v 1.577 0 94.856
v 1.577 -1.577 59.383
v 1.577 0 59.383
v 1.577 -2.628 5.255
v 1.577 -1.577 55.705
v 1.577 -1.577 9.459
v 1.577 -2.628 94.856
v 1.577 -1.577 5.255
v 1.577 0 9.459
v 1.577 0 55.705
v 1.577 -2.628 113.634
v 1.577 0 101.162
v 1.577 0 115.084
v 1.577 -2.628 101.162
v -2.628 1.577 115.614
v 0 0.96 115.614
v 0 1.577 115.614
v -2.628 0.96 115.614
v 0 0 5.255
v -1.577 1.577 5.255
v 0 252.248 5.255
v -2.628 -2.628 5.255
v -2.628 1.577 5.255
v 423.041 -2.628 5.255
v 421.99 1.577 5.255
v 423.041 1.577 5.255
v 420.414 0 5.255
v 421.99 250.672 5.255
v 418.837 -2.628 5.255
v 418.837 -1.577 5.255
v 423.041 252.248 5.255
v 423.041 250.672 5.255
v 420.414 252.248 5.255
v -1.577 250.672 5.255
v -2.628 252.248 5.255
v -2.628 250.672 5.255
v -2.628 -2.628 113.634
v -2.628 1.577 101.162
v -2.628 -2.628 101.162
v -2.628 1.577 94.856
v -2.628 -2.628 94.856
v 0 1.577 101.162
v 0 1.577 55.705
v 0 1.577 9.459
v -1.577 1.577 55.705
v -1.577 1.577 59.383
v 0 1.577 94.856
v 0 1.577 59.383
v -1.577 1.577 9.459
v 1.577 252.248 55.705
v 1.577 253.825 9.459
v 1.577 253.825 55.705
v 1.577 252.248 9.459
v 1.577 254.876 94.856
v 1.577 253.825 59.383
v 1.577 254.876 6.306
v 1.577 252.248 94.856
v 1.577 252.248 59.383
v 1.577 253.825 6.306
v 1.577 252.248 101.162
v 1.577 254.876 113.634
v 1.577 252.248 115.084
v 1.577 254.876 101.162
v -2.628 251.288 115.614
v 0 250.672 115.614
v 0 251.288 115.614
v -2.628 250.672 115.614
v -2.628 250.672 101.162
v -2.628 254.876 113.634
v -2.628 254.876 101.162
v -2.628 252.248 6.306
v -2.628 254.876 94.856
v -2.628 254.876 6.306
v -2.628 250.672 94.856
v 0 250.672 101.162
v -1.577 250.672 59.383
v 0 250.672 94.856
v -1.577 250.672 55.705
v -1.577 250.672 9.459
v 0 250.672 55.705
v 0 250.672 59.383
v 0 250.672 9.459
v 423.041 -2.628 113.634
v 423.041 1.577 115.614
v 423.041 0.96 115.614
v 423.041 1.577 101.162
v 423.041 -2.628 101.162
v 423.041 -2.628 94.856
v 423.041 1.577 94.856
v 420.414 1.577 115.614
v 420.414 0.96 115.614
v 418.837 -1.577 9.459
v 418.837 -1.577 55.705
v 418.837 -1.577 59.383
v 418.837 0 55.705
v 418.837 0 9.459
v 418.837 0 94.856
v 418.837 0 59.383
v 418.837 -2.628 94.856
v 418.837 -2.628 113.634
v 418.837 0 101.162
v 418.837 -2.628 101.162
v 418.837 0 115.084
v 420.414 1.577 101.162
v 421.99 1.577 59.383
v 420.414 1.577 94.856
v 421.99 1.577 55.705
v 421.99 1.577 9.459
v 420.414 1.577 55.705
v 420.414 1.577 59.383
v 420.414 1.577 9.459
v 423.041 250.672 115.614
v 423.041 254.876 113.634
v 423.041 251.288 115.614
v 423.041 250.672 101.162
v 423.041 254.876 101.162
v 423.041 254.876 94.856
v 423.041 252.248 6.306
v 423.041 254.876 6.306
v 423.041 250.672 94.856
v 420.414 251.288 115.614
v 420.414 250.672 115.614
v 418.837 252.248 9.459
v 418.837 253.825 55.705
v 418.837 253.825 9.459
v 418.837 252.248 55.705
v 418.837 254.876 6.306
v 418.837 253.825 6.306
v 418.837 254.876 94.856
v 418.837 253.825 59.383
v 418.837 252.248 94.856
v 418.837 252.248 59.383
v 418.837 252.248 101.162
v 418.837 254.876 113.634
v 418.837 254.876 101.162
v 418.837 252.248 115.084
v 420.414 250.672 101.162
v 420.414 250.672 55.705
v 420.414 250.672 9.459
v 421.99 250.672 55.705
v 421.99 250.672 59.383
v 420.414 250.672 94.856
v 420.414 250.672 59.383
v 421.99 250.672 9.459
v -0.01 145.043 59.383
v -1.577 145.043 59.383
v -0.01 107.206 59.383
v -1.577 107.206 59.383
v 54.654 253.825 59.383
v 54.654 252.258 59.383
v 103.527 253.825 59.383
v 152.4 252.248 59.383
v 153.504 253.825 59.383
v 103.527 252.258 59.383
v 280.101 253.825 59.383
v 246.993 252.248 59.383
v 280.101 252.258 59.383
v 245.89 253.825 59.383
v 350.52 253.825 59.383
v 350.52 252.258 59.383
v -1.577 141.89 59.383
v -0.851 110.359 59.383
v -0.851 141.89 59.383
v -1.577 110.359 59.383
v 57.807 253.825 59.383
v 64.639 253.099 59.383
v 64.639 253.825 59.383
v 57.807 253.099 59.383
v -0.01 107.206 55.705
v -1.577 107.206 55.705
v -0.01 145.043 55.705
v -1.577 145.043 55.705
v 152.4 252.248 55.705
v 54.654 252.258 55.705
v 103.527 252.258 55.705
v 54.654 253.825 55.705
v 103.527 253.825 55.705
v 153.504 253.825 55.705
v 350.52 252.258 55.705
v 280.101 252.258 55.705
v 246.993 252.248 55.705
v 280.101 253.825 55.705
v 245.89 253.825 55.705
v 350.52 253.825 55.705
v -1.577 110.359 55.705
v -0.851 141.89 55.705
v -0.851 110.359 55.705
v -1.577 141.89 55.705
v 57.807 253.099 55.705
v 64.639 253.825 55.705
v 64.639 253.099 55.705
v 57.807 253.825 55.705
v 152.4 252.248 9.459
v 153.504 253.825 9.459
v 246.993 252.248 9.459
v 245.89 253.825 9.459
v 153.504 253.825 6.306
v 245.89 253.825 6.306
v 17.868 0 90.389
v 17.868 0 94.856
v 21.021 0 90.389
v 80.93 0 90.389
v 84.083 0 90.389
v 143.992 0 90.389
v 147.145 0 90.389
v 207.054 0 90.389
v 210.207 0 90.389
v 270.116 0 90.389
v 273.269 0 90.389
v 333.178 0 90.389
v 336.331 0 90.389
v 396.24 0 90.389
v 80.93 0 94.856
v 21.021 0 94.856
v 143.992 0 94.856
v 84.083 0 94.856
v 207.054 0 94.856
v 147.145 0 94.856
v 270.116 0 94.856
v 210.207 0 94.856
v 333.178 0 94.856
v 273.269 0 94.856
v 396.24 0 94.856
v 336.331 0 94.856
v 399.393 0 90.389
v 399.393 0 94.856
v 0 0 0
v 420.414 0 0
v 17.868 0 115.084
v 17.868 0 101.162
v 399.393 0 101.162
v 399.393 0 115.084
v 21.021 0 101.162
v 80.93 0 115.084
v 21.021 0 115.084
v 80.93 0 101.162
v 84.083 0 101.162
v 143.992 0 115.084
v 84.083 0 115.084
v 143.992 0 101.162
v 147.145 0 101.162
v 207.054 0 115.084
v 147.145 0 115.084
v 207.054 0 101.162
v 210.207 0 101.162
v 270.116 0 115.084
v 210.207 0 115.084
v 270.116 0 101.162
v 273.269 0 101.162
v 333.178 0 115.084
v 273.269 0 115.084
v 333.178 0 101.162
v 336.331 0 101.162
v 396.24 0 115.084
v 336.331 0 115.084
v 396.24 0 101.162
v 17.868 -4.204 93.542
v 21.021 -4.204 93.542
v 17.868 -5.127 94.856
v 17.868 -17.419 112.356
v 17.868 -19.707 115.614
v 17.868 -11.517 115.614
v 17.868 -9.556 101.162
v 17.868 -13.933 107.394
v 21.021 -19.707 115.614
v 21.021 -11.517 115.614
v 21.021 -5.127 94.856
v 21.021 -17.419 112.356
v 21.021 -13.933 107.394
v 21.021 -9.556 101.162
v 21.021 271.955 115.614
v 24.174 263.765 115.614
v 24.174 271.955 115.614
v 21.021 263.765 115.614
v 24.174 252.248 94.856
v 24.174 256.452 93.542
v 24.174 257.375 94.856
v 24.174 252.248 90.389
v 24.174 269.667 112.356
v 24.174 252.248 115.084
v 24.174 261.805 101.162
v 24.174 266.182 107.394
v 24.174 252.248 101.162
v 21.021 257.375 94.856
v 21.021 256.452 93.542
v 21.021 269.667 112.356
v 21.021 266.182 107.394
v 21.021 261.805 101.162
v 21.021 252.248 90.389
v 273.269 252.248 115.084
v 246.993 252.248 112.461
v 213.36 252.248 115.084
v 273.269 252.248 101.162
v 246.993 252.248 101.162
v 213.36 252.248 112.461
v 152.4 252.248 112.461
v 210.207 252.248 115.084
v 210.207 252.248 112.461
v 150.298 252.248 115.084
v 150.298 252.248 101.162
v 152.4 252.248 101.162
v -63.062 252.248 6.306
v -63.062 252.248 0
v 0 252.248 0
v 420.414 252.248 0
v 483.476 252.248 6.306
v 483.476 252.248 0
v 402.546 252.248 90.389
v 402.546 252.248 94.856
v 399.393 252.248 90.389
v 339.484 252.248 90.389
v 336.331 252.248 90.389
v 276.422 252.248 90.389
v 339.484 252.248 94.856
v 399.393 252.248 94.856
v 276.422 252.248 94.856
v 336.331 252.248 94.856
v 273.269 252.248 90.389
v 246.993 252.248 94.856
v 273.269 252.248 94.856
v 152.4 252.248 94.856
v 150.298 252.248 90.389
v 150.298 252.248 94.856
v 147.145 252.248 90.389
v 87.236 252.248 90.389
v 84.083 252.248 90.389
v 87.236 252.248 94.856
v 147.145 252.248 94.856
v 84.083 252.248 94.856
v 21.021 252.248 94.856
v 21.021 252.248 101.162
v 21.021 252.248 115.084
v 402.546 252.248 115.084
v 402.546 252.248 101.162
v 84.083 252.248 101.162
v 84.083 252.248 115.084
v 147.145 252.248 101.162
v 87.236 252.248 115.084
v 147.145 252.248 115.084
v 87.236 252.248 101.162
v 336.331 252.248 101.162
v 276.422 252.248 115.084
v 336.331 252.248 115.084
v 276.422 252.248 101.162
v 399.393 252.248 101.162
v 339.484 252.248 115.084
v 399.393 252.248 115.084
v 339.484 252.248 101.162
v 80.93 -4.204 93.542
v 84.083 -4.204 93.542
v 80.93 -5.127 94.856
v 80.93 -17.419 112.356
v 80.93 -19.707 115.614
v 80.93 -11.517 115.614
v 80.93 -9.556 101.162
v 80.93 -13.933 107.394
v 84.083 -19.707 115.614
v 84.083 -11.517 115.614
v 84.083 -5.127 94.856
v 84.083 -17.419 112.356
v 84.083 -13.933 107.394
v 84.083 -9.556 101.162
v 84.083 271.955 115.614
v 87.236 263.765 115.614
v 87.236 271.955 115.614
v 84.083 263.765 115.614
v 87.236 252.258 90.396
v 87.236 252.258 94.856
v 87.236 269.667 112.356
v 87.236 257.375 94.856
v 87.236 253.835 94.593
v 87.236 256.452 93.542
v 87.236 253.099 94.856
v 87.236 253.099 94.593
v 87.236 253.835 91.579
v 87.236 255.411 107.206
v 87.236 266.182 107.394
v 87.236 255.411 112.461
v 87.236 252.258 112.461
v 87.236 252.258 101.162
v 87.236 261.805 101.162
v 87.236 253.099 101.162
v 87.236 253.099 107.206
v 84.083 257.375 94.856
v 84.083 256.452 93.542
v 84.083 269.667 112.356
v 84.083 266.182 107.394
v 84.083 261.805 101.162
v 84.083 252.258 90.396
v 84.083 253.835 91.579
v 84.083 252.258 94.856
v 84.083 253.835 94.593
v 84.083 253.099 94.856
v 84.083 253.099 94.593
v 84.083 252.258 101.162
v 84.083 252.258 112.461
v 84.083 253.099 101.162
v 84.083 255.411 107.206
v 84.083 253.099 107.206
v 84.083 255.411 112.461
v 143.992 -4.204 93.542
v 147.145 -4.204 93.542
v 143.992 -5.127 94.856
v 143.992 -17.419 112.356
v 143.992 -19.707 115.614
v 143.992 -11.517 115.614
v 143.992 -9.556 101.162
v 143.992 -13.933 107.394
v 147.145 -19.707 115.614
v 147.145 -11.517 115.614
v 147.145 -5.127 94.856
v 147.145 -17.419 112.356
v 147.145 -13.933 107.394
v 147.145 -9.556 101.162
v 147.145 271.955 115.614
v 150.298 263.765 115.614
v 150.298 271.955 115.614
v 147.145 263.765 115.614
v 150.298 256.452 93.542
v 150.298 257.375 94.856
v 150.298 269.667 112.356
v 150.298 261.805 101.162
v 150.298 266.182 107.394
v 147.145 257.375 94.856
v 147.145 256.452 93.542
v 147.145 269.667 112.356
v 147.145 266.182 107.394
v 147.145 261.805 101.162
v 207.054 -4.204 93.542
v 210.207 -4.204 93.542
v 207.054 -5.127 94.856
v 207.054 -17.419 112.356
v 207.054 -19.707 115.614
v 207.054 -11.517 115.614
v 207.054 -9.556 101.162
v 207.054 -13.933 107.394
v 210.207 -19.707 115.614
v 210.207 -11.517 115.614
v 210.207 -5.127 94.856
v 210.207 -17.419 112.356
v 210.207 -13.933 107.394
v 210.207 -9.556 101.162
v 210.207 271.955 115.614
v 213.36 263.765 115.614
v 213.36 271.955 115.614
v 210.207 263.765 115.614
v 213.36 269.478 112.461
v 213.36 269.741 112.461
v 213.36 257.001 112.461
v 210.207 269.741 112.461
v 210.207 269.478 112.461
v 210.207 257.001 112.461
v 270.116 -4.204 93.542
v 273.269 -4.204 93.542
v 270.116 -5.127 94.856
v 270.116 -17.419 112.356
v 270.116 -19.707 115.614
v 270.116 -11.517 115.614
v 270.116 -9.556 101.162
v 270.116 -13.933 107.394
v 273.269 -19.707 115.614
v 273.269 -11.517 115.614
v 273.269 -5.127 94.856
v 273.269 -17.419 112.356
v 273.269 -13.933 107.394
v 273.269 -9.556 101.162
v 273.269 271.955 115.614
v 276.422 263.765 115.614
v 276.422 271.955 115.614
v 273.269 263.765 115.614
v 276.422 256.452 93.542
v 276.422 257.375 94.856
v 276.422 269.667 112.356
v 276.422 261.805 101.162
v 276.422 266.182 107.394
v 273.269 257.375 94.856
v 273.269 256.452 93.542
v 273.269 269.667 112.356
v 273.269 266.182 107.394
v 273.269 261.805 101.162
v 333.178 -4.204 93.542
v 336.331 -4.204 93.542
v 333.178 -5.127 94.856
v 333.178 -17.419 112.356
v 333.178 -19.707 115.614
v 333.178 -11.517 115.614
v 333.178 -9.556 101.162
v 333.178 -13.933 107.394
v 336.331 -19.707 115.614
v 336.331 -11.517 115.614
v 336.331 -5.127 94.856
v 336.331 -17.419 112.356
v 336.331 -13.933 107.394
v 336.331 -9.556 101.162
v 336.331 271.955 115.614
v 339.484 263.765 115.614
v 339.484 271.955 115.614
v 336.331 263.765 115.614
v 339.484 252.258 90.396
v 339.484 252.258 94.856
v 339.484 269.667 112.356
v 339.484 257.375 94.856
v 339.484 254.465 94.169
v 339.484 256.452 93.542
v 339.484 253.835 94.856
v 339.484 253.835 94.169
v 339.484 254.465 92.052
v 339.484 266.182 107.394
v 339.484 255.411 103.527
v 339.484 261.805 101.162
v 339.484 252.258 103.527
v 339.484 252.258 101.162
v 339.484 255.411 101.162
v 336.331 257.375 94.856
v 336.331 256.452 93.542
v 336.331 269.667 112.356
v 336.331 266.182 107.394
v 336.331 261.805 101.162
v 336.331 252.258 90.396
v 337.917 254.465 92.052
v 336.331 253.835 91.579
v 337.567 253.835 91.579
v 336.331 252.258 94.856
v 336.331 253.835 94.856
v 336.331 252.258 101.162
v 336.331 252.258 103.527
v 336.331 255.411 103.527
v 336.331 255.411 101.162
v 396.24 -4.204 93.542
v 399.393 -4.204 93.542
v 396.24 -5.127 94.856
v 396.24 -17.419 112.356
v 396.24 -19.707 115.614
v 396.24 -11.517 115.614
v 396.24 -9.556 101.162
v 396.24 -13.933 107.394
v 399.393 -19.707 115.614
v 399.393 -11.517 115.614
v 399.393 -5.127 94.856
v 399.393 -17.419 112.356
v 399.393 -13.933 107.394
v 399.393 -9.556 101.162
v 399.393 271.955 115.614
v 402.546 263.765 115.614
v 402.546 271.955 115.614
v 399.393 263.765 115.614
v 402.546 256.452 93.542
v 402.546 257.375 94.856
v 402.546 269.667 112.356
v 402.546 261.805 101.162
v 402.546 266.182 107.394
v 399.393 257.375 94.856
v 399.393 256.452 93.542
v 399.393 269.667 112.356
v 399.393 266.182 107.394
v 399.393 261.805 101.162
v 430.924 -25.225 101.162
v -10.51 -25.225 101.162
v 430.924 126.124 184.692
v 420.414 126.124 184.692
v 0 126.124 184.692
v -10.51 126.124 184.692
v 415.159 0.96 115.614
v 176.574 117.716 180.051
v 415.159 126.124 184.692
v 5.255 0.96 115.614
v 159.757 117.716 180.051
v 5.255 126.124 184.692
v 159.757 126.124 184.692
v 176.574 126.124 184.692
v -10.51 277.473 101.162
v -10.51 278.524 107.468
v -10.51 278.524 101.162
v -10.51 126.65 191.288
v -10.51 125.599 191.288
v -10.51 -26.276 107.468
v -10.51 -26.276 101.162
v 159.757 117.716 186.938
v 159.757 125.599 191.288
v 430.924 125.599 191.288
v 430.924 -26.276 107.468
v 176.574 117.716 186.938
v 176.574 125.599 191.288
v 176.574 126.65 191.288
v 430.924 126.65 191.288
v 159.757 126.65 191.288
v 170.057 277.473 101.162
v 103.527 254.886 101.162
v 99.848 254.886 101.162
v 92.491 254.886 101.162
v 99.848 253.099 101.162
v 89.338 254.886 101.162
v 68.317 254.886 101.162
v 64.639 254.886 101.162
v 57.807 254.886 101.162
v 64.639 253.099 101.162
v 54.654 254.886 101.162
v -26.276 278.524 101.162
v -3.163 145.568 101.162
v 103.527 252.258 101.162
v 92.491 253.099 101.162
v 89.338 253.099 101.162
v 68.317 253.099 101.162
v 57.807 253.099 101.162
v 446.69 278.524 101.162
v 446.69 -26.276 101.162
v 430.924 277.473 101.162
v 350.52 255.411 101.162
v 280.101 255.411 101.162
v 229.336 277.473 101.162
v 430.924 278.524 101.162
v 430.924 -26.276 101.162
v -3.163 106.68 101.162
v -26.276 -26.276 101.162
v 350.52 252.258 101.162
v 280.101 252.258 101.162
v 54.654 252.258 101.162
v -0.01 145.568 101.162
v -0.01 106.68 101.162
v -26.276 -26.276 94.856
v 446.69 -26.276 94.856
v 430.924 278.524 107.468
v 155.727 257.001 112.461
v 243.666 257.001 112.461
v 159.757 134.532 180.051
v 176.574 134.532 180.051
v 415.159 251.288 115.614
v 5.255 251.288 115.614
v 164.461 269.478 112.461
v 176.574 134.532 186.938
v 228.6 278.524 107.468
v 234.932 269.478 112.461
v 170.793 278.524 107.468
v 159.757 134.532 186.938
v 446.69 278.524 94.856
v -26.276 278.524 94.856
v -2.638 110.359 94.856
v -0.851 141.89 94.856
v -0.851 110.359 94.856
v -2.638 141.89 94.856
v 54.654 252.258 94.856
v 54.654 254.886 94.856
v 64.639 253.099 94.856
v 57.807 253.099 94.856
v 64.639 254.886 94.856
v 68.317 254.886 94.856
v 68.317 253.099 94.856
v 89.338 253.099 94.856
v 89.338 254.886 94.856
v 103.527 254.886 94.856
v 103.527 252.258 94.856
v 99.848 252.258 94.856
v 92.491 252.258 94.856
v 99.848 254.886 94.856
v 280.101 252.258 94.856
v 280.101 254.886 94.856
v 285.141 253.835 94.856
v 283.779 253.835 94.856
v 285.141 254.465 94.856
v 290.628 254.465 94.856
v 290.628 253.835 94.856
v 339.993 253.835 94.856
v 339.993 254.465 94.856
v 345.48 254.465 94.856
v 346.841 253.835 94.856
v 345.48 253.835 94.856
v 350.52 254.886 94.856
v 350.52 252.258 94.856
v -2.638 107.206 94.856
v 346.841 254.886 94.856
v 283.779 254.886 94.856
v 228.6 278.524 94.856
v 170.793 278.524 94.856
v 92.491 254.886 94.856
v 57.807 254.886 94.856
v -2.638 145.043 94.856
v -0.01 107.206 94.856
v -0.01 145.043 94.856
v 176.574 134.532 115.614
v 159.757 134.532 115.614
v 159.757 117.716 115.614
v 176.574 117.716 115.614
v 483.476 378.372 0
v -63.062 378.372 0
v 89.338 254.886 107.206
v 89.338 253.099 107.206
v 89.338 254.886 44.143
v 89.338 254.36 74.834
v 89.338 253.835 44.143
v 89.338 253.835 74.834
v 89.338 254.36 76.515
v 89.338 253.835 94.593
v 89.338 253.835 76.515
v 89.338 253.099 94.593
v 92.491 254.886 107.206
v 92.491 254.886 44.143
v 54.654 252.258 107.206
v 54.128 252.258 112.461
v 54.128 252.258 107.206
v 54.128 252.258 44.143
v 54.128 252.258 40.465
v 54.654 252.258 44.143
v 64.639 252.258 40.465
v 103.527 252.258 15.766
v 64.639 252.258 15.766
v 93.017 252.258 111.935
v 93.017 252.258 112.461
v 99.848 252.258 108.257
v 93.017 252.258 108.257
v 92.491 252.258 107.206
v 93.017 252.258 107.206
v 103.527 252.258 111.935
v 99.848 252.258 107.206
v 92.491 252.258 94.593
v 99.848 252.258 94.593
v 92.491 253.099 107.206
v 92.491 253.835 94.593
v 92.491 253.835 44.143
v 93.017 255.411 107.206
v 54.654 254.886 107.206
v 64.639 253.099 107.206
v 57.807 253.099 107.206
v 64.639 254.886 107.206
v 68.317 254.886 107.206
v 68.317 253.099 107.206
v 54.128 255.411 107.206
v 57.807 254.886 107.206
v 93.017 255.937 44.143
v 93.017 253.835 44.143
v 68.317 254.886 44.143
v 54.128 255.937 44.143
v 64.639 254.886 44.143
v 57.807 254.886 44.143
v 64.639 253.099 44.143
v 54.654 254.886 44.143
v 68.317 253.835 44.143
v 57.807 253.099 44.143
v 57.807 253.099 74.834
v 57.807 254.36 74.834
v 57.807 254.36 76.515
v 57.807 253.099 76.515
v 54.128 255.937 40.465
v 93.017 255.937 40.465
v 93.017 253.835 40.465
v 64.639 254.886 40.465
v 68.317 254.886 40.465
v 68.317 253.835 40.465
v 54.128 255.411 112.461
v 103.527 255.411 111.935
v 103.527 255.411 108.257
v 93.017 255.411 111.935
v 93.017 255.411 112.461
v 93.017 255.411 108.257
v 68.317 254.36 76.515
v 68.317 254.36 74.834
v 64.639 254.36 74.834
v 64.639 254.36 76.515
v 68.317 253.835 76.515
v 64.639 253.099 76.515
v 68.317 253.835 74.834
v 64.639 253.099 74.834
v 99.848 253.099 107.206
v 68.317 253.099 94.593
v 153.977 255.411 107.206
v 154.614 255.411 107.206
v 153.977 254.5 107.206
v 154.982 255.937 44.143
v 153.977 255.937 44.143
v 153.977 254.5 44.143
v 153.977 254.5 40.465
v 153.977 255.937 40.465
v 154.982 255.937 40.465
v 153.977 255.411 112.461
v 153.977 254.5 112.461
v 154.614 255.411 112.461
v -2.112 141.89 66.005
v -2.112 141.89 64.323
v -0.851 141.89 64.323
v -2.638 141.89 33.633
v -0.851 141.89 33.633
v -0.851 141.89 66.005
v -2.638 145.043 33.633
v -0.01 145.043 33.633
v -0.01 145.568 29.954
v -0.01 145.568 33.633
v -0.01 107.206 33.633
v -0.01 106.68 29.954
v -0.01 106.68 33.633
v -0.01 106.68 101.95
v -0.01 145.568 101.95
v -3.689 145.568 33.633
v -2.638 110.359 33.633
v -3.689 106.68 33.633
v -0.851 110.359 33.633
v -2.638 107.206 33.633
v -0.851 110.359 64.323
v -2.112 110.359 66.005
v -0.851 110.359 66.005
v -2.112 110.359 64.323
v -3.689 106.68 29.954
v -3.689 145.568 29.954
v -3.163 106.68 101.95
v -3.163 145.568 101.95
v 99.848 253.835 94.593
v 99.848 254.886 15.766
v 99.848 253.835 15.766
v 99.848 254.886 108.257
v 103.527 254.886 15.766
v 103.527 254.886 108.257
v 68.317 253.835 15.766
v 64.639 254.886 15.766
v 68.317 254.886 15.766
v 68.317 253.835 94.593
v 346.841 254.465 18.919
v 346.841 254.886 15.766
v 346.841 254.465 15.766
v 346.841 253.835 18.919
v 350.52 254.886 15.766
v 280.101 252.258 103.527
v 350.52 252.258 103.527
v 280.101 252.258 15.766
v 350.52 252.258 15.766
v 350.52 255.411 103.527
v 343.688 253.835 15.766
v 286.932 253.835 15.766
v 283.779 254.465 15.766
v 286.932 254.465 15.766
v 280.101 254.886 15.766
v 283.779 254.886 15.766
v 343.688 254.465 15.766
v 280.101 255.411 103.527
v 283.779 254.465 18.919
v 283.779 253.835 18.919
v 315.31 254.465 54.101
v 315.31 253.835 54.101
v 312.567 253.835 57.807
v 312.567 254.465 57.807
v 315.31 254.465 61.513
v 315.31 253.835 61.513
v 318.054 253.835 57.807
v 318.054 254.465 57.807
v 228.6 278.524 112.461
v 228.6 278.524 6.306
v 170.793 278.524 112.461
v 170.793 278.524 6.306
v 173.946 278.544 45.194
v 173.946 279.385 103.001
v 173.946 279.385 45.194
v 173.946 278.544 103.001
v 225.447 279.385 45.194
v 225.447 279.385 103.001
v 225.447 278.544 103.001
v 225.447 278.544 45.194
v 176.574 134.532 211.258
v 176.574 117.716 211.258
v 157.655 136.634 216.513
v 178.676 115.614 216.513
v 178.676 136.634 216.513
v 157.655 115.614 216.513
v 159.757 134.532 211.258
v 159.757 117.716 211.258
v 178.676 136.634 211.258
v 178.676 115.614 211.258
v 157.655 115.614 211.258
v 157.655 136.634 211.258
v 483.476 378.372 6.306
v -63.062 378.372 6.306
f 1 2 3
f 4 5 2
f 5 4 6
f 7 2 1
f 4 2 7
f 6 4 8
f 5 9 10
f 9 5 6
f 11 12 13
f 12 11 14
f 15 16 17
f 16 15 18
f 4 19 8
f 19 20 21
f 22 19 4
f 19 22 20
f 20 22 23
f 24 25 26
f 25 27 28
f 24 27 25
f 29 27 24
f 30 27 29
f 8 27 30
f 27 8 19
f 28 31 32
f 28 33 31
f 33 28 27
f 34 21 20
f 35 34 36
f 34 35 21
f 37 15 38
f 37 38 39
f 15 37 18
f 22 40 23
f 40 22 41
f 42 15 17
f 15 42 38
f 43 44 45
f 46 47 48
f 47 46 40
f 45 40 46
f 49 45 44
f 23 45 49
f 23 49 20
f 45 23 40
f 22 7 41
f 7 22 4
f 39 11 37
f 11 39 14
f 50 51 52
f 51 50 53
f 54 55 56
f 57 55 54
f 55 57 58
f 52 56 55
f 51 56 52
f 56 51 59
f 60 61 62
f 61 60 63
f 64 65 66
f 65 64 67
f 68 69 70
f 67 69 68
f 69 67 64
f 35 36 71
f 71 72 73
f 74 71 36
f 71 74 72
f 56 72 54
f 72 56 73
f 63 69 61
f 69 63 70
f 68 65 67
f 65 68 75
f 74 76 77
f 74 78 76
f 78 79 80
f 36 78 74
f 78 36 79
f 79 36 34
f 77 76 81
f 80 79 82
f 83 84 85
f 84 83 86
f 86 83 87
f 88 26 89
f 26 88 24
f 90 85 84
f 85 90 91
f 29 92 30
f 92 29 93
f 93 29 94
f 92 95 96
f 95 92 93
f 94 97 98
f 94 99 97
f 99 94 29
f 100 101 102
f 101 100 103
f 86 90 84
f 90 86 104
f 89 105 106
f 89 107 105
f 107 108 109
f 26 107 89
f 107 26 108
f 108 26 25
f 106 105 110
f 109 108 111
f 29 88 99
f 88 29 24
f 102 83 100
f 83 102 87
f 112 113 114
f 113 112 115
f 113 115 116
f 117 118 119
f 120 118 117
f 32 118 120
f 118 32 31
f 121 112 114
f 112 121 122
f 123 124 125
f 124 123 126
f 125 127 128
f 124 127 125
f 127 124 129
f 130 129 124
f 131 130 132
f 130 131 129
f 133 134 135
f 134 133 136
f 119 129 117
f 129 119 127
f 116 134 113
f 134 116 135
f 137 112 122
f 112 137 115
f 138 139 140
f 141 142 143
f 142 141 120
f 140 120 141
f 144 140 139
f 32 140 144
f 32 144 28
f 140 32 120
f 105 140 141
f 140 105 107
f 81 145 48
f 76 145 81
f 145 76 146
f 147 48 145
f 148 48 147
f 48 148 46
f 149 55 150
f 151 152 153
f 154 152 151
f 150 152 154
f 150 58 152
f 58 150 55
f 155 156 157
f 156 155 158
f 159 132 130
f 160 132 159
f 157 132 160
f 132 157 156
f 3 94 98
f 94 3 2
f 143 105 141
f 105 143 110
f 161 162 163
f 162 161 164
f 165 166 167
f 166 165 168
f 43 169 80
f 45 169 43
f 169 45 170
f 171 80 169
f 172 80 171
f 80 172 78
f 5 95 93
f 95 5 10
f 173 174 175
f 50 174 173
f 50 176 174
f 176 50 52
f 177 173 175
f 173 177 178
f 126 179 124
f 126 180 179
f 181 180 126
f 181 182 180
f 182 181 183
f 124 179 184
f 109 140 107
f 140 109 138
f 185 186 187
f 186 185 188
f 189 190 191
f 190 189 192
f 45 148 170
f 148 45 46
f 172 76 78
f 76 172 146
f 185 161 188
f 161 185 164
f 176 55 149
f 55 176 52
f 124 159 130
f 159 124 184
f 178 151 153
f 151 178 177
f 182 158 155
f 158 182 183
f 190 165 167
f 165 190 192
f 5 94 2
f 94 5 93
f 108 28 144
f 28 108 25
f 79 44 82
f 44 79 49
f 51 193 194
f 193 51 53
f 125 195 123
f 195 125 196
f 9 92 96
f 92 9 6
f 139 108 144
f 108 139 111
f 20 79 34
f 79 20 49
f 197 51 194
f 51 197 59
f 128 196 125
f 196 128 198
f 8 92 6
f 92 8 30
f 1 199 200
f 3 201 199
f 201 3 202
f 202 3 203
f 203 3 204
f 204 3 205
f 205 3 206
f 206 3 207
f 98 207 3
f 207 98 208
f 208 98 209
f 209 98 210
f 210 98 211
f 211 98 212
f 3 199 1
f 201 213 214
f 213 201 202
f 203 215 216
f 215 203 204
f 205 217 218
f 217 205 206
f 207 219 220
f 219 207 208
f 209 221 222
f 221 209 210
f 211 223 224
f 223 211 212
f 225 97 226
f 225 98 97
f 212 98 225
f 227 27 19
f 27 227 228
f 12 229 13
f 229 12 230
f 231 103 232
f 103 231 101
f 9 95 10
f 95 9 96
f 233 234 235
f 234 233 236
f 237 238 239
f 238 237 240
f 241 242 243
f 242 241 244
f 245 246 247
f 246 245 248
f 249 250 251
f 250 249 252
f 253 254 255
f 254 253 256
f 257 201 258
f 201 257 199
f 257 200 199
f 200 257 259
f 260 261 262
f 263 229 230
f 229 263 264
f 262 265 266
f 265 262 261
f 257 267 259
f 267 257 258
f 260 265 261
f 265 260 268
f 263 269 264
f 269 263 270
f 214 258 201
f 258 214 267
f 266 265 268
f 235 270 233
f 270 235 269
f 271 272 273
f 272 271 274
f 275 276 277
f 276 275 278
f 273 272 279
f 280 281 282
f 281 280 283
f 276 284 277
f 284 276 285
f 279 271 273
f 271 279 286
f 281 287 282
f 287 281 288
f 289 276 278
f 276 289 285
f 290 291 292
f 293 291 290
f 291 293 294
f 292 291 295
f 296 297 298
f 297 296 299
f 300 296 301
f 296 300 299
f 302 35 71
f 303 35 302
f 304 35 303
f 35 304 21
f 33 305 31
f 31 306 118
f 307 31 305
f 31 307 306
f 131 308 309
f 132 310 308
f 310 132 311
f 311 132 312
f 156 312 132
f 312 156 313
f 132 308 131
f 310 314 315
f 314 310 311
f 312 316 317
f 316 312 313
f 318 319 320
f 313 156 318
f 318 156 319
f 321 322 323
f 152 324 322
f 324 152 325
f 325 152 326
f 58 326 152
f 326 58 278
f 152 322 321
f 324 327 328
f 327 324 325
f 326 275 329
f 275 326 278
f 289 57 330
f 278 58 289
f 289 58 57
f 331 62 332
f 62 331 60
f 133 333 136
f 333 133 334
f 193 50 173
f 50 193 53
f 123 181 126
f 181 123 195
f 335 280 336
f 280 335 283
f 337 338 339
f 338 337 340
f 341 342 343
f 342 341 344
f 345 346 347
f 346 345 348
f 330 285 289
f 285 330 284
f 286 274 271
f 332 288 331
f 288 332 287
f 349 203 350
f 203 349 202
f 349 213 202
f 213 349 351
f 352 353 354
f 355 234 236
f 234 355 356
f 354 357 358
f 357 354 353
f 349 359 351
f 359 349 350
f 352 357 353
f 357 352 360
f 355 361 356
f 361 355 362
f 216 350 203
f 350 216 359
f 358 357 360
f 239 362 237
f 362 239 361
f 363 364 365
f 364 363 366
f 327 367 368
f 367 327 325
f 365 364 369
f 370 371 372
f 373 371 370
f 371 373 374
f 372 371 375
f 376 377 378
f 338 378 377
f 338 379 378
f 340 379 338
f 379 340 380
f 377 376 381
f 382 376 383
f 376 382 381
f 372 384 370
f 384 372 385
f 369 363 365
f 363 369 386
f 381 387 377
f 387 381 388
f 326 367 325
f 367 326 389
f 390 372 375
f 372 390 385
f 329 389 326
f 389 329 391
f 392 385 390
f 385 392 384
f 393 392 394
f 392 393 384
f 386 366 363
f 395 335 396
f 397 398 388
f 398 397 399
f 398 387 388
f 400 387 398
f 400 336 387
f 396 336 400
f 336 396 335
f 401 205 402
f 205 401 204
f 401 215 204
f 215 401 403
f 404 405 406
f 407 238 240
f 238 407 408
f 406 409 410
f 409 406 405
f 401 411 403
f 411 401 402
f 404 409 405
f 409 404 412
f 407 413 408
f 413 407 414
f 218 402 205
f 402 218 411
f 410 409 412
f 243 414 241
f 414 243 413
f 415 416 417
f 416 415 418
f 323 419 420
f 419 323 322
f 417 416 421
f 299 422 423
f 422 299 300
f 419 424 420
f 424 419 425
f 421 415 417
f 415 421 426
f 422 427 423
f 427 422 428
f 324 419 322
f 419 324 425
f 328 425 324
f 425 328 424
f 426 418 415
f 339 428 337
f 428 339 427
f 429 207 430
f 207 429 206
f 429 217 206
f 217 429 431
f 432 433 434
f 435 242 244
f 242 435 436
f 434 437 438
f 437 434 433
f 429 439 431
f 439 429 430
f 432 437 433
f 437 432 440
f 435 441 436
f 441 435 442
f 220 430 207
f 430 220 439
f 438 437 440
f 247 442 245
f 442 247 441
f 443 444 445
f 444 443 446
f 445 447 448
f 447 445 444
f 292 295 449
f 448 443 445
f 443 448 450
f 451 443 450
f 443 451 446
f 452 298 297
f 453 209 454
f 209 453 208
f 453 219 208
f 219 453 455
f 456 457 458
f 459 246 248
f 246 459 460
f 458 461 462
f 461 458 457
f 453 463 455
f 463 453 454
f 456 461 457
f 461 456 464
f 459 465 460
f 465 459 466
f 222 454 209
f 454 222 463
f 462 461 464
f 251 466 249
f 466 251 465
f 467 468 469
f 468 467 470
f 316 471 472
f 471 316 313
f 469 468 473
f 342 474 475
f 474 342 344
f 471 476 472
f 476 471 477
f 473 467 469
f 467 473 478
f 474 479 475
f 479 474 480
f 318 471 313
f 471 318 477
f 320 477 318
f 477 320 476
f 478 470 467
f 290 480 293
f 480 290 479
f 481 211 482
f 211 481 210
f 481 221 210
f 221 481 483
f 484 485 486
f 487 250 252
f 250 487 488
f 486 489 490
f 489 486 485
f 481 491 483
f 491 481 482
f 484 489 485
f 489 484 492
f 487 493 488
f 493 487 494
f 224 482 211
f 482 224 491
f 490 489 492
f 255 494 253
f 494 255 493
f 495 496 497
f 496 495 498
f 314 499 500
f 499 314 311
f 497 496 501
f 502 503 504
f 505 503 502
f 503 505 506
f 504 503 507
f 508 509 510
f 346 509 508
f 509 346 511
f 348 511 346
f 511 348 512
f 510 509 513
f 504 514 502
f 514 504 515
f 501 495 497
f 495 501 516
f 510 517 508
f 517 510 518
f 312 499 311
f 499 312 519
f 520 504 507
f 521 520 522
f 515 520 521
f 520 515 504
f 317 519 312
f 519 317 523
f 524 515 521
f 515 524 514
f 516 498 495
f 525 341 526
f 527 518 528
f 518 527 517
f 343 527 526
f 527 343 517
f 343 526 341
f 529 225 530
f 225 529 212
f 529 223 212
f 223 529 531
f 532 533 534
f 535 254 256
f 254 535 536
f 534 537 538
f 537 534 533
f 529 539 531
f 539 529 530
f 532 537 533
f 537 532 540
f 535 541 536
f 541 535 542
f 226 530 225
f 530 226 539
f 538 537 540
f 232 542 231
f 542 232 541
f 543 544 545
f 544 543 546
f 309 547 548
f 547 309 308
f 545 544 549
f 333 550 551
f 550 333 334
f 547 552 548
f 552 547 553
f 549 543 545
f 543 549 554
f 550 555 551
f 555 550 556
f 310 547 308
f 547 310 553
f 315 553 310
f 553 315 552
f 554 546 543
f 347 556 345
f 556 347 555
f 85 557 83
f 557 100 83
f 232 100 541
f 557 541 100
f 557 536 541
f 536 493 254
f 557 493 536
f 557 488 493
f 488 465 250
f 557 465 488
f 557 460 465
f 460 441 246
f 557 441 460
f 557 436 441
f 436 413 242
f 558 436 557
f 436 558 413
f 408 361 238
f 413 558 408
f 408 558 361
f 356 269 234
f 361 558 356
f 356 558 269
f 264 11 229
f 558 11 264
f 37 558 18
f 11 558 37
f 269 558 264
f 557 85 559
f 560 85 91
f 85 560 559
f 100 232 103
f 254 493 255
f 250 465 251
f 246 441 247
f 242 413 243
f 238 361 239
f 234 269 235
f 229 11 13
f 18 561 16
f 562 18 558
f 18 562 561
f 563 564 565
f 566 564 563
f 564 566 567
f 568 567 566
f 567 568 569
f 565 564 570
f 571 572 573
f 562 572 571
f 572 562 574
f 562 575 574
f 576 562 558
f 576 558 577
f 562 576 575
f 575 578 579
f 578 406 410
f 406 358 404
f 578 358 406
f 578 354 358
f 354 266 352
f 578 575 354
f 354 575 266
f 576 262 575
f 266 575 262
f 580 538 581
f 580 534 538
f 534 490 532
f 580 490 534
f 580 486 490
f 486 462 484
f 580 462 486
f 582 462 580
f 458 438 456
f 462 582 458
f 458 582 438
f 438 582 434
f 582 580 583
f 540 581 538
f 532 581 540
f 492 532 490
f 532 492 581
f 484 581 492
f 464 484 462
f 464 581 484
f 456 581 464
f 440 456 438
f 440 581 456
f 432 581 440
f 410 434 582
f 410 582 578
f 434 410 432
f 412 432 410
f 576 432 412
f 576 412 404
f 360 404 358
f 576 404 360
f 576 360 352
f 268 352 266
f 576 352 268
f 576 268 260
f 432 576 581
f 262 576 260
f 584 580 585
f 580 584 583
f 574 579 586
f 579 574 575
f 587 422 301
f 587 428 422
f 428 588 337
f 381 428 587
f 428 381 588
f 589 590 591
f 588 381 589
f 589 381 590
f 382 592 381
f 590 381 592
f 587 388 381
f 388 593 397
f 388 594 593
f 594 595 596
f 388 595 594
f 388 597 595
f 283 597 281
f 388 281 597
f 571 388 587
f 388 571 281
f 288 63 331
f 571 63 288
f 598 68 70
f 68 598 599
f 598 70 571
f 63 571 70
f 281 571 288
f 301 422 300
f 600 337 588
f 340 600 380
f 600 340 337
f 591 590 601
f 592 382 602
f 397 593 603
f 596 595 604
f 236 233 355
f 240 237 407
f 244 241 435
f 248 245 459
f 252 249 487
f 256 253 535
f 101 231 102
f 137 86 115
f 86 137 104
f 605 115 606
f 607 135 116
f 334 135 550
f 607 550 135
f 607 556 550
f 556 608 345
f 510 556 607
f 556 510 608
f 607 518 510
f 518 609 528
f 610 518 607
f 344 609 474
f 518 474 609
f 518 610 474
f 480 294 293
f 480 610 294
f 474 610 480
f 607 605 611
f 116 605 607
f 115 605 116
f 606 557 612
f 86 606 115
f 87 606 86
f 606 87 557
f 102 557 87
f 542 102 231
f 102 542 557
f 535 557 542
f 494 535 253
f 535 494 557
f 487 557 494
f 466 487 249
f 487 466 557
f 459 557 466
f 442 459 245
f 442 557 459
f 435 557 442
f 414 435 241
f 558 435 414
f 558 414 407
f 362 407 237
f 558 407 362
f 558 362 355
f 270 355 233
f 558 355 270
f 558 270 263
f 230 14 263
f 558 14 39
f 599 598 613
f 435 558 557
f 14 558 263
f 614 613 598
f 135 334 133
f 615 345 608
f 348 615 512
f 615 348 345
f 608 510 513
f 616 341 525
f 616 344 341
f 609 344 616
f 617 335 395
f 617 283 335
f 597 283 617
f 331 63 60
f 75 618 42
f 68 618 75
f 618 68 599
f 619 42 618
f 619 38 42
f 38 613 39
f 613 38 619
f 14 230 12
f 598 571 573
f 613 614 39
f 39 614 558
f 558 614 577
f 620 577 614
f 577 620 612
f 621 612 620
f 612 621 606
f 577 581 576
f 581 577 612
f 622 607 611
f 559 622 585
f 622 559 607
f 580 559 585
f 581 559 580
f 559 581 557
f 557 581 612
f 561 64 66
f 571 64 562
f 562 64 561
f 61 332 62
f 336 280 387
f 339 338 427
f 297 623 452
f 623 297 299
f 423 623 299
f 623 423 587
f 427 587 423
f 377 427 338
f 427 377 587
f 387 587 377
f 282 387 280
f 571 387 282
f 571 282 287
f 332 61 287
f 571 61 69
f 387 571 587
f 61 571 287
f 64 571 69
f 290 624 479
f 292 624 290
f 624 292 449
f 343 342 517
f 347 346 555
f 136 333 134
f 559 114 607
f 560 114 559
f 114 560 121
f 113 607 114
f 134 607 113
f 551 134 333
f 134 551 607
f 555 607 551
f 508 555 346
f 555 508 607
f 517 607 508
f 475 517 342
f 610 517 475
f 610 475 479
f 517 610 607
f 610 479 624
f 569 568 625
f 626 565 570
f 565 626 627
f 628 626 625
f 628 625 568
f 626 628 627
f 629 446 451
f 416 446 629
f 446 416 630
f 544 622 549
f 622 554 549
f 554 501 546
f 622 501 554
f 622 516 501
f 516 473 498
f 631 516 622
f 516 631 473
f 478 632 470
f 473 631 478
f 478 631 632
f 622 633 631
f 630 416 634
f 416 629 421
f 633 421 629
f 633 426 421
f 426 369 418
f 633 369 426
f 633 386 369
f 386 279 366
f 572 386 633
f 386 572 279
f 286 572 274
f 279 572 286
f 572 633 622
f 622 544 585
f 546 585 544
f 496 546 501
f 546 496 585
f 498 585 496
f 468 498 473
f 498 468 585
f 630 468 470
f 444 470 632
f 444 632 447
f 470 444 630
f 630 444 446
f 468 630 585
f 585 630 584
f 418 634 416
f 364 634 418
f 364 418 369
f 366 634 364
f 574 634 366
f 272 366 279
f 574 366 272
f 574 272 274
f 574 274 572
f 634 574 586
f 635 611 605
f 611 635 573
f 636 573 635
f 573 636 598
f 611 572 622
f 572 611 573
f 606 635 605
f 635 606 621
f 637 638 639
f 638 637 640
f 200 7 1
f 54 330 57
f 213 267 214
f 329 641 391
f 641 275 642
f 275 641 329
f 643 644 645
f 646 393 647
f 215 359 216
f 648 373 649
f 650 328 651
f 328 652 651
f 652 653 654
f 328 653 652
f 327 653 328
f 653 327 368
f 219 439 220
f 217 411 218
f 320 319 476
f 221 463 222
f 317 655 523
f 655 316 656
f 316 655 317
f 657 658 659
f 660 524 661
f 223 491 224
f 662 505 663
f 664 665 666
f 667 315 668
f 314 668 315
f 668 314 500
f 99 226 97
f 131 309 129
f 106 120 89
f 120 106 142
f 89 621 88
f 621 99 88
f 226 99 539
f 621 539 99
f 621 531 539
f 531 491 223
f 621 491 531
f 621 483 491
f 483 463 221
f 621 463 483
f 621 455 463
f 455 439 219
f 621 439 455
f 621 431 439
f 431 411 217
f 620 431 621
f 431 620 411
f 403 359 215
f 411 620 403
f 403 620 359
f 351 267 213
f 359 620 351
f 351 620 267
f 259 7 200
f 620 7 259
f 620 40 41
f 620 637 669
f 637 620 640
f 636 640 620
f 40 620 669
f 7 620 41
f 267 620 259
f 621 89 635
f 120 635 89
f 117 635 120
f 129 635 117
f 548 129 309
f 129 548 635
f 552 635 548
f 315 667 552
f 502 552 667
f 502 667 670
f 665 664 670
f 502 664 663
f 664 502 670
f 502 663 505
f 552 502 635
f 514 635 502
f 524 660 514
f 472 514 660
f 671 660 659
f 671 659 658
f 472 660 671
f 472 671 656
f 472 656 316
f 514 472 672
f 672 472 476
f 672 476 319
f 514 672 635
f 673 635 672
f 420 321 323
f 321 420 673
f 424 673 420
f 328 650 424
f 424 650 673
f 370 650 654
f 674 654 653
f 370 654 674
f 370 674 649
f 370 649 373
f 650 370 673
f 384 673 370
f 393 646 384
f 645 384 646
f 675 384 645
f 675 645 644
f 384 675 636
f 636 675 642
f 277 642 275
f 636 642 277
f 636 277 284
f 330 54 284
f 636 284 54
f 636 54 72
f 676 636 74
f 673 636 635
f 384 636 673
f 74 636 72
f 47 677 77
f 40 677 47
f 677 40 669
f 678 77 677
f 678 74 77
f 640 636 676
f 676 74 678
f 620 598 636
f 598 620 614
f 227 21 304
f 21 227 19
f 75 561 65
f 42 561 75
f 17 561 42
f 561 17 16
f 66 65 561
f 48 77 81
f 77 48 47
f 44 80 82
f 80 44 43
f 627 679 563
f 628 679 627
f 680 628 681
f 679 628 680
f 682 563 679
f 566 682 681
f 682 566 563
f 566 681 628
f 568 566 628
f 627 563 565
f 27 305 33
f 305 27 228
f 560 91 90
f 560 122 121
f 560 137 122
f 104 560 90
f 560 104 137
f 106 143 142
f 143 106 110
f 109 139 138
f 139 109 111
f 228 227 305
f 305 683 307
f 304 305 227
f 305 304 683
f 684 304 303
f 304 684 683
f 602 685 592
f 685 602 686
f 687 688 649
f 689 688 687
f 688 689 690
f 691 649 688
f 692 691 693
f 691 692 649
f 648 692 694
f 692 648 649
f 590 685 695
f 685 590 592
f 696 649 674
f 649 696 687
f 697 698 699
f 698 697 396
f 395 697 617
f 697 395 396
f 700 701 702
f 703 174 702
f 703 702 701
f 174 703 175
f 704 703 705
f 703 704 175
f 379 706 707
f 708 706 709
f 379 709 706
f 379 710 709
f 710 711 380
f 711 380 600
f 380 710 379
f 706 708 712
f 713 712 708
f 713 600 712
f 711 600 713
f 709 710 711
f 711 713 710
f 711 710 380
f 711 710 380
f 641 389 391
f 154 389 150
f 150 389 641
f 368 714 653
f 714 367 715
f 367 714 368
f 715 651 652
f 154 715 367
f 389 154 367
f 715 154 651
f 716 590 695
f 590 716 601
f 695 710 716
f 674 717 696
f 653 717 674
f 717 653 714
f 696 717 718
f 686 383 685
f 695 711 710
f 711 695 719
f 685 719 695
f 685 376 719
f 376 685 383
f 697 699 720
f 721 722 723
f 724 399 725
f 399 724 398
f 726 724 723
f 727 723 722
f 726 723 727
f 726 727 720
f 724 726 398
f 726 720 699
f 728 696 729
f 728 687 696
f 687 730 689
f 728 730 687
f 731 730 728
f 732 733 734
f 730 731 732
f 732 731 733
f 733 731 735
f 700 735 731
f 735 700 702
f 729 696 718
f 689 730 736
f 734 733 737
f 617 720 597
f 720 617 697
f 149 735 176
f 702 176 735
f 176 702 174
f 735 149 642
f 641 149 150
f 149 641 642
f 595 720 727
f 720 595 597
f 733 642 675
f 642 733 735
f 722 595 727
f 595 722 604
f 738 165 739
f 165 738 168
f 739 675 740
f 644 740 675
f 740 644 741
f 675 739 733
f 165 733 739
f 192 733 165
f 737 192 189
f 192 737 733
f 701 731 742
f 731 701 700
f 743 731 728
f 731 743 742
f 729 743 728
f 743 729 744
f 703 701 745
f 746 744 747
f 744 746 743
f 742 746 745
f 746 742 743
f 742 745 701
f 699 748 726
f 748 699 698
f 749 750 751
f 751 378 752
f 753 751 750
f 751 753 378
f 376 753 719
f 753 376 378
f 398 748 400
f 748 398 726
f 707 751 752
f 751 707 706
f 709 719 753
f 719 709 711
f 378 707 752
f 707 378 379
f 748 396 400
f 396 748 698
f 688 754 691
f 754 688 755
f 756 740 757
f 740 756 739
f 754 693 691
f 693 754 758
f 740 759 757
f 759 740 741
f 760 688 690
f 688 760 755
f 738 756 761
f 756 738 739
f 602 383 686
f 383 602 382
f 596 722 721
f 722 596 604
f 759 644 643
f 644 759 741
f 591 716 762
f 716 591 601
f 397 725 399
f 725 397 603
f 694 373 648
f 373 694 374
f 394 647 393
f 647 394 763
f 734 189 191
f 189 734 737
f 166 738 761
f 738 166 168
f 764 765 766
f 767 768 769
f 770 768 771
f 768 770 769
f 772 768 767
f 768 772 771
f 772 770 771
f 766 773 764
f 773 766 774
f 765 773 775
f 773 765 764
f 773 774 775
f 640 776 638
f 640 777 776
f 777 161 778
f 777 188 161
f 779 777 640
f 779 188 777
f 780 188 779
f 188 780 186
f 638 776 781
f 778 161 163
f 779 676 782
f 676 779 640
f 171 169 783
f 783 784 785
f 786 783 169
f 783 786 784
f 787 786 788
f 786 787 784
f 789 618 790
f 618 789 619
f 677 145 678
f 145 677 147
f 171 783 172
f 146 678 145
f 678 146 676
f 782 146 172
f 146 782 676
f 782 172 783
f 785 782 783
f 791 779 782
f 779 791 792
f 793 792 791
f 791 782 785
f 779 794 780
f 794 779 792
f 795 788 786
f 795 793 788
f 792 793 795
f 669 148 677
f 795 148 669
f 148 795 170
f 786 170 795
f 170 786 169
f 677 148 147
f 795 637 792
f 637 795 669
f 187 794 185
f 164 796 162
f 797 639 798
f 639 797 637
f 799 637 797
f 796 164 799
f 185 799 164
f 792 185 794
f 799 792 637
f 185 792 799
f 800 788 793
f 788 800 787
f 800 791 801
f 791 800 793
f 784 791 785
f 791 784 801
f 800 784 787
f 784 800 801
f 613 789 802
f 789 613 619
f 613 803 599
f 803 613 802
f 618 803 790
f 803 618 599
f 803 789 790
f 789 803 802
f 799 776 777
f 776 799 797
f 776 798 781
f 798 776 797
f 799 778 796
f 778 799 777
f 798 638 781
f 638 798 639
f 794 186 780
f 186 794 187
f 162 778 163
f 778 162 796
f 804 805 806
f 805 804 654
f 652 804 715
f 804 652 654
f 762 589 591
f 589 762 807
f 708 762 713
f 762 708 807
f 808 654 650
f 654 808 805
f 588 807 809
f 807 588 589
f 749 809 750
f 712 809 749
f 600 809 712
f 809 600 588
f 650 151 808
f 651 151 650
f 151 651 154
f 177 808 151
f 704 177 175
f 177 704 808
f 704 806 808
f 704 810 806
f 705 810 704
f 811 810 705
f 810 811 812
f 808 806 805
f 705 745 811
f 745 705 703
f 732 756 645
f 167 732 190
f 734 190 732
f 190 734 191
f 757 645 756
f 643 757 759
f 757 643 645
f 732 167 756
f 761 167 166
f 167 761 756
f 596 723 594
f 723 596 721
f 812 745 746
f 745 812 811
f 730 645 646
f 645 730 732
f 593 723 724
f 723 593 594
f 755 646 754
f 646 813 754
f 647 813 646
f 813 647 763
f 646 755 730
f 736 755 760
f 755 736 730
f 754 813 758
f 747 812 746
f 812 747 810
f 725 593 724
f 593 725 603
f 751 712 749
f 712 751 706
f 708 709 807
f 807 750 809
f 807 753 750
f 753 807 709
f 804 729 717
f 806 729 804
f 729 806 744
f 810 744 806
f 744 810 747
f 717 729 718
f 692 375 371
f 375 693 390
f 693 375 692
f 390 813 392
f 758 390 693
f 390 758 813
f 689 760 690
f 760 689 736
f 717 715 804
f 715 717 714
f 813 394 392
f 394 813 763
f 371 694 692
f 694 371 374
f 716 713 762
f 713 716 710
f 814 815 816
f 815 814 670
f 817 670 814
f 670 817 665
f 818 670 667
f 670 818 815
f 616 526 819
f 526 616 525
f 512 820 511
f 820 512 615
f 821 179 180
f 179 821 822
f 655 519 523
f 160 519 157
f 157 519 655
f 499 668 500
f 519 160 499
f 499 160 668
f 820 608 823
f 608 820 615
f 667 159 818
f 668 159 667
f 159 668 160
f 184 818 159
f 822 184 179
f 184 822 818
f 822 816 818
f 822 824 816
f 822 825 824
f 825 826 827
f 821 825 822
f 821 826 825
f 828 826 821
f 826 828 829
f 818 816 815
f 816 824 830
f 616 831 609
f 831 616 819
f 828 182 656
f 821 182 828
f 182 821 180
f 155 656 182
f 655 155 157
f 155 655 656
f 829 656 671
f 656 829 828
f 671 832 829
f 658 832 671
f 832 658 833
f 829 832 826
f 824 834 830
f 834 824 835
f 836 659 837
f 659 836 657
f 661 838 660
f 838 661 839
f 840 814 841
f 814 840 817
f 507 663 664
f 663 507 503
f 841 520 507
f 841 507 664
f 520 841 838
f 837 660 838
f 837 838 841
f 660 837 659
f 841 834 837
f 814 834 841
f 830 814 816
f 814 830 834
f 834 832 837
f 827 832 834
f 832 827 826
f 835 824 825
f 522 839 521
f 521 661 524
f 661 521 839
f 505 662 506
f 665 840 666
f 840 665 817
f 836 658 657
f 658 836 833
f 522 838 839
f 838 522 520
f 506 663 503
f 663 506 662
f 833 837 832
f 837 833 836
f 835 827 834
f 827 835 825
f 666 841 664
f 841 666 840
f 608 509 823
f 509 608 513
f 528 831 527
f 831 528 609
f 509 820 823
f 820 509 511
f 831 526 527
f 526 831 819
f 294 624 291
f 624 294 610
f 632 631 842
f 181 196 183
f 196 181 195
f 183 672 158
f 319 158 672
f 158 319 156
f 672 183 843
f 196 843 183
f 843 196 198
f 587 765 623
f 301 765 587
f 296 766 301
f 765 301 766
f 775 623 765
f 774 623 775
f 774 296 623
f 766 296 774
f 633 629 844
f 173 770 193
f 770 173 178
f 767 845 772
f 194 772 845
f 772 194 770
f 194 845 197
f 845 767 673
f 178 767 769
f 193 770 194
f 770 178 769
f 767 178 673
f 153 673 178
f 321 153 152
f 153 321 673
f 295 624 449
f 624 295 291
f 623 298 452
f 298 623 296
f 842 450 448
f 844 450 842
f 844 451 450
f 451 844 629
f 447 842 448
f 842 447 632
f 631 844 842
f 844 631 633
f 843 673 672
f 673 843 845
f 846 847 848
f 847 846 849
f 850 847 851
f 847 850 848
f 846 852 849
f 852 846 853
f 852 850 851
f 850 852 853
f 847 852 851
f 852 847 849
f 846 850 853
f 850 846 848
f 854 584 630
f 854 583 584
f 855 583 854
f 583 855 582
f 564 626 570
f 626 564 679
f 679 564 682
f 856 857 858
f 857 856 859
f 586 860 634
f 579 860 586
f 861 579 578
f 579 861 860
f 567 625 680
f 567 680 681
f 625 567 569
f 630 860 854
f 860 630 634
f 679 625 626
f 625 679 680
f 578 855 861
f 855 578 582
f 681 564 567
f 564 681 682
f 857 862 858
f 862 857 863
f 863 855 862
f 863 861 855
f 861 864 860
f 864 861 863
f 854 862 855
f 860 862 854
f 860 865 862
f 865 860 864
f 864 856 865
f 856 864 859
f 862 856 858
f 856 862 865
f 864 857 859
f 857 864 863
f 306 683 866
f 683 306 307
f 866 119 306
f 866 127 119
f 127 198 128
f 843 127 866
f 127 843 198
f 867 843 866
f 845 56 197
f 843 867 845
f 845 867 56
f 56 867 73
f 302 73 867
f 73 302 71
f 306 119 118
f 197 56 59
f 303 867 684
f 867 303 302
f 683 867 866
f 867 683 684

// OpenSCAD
// =====================================================================
//  MILWAUKEE ROAD - STANDARD 24 X 40 FT DEPOT, VENTURA AND HOBART, IOWA (C.M.&ST.P., NOV 1898)
//  Album of Depot Plans (1919), sheet 04. Private reference (in copyright):
//  Research Library / RSW / Stations / Standard depots / Album of Depot Plans 1919.
//  Rib Side Works, 24 Nov 2026. FIRST SHAPE MODEL for review - not cut into print sections.
//  KNOWN (from the sheet): 24 x 40 ft; waiting room 14, freight room 26, office 16 with bay; shingle roof with cresting, drop siding; also at Bassett and Chatsworth, Iowa.
//  ESTIMATE: wall and ridge heights (sheets are small copies), window spacing, colours.
//  Shared depot builder ../../../_common/rsw_depot.scad (x along the track, y = 0 town side,
//  track side +y, feet).  SCALE: 29 = G, 48 = O, 87 = HO.
// =====================================================================
SCALE = 29;
include <../../../_common/rsw_depot.scad>

depot(blocks = [[0, 40, 0, 24, 11, 0.55, 1, 2.5, 0]],
      pavs   = [],
      wins   = [[7.0, 1, 3, 6, 4.2], [16.5, 1, 3, 6, 4.2], [12, 2, 3, 6, 3.2]],
      doors  = [[8, 1, 3, 7.5, 0], [30, 1, 6, 8, 2]],
      bays   = [[19, 1, 9, 2.5]],
      chims  = [[16, 12, 20.6]],
      plat   = [-6, 52, 12, 0.6]);
